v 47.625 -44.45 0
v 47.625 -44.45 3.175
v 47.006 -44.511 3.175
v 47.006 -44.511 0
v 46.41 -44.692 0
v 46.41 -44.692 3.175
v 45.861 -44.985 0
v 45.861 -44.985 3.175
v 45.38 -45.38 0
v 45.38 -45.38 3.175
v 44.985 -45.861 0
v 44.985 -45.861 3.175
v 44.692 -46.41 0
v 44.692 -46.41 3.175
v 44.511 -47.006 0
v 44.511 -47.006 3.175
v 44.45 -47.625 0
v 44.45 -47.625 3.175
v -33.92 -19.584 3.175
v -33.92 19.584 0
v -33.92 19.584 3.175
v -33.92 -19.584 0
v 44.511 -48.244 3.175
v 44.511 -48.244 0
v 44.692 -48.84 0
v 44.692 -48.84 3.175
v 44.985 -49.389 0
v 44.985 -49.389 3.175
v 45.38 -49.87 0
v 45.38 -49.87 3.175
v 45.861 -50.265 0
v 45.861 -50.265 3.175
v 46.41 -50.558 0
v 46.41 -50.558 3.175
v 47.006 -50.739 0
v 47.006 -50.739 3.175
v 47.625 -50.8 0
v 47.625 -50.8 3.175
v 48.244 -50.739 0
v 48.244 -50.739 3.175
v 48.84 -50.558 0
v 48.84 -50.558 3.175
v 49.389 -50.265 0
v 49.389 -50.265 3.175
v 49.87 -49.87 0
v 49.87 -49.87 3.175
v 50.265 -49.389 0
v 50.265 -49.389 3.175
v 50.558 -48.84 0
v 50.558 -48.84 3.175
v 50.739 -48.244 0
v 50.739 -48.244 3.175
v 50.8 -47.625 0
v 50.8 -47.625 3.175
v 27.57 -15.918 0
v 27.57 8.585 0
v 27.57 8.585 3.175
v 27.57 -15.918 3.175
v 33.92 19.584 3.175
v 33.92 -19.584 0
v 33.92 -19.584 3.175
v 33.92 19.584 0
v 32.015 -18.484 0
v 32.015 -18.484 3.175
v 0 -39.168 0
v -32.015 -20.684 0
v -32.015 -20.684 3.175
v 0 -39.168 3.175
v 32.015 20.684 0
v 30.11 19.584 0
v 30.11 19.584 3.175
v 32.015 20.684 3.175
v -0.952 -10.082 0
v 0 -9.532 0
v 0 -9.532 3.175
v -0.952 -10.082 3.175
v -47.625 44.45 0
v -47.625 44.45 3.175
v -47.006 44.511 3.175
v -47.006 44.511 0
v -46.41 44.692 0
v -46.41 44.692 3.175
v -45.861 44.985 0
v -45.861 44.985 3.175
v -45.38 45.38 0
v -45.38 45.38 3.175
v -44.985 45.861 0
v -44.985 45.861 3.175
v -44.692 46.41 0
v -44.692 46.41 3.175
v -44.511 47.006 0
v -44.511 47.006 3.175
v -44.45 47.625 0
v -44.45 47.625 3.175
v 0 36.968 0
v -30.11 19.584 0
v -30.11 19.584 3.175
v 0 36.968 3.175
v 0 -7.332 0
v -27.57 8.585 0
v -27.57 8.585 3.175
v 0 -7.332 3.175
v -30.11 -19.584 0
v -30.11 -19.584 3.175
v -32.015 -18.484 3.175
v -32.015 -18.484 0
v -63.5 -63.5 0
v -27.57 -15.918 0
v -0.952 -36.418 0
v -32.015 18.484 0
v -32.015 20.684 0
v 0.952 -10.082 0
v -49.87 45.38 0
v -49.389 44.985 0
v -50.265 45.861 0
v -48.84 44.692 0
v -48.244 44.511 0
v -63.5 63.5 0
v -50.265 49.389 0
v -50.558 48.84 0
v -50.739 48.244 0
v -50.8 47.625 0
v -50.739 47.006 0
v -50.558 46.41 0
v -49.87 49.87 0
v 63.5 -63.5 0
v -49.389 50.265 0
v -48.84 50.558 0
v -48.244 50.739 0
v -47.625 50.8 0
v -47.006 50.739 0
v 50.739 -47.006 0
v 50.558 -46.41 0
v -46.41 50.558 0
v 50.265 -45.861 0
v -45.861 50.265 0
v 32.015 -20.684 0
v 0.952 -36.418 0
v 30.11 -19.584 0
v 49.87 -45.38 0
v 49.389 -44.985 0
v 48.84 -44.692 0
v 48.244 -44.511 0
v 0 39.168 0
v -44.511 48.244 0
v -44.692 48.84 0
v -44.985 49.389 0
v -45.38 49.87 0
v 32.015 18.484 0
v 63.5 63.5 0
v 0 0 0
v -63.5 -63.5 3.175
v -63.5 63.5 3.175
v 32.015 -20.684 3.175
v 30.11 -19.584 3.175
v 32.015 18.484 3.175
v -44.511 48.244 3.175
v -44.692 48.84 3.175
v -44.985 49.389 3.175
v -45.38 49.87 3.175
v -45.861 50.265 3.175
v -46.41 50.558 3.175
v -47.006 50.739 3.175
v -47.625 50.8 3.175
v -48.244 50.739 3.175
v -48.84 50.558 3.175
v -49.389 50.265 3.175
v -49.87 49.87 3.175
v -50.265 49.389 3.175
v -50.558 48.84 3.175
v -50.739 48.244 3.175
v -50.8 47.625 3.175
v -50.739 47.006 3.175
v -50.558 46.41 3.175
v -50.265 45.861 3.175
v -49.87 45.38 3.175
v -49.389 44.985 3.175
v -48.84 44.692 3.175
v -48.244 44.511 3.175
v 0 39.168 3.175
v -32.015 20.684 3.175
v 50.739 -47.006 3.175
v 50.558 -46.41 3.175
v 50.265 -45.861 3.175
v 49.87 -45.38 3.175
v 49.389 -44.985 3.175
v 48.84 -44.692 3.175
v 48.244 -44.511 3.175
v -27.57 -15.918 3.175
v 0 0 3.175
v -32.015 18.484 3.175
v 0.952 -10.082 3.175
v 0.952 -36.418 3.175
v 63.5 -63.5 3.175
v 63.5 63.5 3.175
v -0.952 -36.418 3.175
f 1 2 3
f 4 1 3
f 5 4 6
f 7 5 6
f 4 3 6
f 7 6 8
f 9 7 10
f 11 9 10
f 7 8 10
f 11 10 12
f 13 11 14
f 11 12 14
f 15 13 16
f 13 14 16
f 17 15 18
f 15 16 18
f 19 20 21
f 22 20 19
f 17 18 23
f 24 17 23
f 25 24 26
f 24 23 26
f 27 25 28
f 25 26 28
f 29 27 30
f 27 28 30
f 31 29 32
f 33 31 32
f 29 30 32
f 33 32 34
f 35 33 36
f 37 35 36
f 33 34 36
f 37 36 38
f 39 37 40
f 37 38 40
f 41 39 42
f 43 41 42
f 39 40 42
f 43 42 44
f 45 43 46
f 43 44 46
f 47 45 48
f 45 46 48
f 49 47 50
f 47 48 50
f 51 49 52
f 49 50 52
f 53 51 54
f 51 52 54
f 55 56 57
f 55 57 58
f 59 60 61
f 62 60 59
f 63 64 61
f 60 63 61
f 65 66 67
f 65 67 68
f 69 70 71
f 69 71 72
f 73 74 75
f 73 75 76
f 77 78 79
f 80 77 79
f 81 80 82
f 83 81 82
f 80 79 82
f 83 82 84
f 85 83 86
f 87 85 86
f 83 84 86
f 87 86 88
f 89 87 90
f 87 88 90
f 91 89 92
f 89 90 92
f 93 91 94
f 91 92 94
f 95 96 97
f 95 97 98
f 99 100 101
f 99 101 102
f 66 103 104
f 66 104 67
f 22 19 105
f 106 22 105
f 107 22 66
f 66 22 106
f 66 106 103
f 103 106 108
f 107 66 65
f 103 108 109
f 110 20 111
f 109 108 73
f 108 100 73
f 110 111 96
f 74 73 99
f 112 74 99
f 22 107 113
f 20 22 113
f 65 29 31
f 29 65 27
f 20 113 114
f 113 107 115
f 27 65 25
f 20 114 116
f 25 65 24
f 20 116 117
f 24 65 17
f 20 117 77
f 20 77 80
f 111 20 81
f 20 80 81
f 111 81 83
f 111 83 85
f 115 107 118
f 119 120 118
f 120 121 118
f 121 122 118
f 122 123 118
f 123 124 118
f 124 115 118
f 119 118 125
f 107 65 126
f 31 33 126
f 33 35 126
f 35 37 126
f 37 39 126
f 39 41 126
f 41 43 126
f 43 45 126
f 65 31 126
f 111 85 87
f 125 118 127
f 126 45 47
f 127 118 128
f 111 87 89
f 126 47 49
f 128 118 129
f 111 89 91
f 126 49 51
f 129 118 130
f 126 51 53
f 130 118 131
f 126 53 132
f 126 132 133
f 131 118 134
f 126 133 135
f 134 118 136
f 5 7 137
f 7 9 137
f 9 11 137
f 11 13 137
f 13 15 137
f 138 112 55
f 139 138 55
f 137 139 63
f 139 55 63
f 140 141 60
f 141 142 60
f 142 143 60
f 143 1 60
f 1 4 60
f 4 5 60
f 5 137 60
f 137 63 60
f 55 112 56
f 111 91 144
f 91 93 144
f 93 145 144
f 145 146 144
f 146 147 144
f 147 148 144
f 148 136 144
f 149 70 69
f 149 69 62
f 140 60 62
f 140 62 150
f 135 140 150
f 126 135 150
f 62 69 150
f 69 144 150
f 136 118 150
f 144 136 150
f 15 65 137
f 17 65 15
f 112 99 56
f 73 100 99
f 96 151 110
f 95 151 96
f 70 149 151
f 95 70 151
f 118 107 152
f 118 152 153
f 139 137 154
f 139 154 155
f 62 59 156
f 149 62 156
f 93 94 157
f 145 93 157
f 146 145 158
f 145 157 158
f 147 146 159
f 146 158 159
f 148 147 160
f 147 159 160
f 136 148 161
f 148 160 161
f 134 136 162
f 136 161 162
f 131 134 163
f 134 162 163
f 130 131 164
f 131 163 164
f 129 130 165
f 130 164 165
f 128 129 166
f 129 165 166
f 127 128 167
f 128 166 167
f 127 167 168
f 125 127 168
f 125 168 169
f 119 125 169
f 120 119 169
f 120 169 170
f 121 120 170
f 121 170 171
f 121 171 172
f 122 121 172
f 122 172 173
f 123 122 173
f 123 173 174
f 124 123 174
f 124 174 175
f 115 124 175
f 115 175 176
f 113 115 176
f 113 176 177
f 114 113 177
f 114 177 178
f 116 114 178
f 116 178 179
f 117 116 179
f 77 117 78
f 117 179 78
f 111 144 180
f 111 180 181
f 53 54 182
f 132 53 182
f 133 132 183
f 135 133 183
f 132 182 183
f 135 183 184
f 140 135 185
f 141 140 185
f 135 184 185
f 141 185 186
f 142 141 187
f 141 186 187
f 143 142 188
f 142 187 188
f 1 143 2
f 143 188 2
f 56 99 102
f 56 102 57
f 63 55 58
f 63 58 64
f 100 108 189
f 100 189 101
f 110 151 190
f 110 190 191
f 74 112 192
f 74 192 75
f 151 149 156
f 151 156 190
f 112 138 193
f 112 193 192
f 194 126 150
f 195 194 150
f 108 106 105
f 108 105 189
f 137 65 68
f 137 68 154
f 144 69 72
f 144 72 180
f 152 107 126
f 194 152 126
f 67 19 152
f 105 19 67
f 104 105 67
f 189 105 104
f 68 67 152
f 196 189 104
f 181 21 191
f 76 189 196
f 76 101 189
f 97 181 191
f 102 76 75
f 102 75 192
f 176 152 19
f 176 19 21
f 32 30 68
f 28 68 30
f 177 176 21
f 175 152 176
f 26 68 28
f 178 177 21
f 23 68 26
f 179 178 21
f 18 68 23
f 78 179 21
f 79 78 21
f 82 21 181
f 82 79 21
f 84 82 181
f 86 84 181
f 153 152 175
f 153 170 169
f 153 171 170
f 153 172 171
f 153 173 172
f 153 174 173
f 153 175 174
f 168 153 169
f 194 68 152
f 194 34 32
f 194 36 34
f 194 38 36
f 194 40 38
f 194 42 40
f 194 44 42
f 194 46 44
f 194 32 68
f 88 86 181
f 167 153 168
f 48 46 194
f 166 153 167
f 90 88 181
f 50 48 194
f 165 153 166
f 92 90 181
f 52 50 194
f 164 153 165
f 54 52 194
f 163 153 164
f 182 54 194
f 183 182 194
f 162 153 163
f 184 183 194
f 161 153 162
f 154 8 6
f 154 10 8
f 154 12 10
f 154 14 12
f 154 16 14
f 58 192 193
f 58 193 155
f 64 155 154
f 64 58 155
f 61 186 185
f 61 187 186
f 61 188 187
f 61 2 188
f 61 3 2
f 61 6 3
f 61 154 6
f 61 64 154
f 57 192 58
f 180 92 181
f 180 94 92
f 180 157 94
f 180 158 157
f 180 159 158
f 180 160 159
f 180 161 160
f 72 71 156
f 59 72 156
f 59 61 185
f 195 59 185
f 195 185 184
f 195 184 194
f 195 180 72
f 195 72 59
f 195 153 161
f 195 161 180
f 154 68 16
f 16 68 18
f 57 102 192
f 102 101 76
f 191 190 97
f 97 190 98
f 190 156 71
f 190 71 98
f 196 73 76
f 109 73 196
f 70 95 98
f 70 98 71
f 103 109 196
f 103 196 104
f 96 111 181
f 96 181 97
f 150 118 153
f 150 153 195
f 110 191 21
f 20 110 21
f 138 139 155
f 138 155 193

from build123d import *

# Parameters (mm, degrees)
F1_W     = 127
F1_H     = 127
F2_DEPTH = 3.175
F3_DEPTH = 25.4
F5_DEPTH = 25.4


with BuildPart() as f2:
    # F1 (on Top) → F2 (new body)
    with BuildSketch(Plane.XY):
        Rectangle(F1_W, F1_H)
    extrude(amount=F2_DEPTH)

    # F0 (on Top) → F3 (cut)
    with BuildSketch(Plane.XY):
        Polygon((0, -39.167517), (32.015065, -20.683611), (30.110065, -19.583758), (0.9525, -36.417886), (0, -36.967812), (-0.9525, -36.417886), (-30.110065, -19.583758), (-32.015065, -20.683611), align=None)
        Polygon((30.110065, 19.583758), (32.015065, 20.683611), (0, 39.167517), (-32.015065, 20.683611), (-30.110065, 19.583758), (0, 36.967812), align=None)
        Polygon((33.920065, -19.583758), (33.920065, 19.583758), (32.015065, 18.483906), (0, 0), (-32.015065, 18.483906), (-33.920065, 19.583758), (-33.920065, -19.583758), (-32.015065, -18.483906), (-27.570065, -15.917584), (-27.570065, 6.385531), (-27.570065, 8.585236), (0, -7.332348), (27.570065, 8.585236), (27.570065, 6.385531), (27.570065, -15.917584), (32.015065, -18.483906), align=None)
        Polygon((0, -36.967812), (0.9525, -36.417886), (0.9525, -10.081979), (0, -9.532053), align=None)
        Polygon((-0.9525, -36.417886), (0, -36.967812), (0, -9.532053), (-0.9525, -10.081979), align=None)
    extrude(amount=F3_DEPTH, mode=Mode.SUBTRACT)

    # F4 (on face) → F5 (cut)
    with BuildSketch(Plane.XY.offset(3.175)):
        with BuildLine():
            ThreePointArc((-47.625, 44.45), (-45.379936, 45.379936), (-44.45, 47.625))
            Line((-44.45, 47.625), (-47.625, 47.625))
            Line((-47.625, 47.625), (-47.625, 44.45))
        make_face()
        with BuildLine():
            Line((-47.625, 47.625), (-44.45, 47.625))
            ThreePointArc((-44.45, 47.625), (-49.870064, 49.870064), (-47.625, 44.45))
            Line((-47.625, 44.45), (-47.625, 47.625))
        make_face()
        with BuildLine():
            ThreePointArc((50.8, -47.625), (49.870064, -45.379936), (47.625, -44.45))
            Line((47.625, -44.45), (47.625, -47.625))
            Line((47.625, -47.625), (44.45, -47.625))
            ThreePointArc((44.45, -47.625), (47.625, -50.8), (50.8, -47.625))
        make_face()
        with BuildLine():
            Line((47.625, -47.625), (47.625, -44.45))
            ThreePointArc((47.625, -44.45), (45.379936, -45.379936), (44.45, -47.625))
            Line((44.45, -47.625), (47.625, -47.625))
        make_face()
    extrude(amount=-F5_DEPTH, mode=Mode.SUBTRACT)


solid = f2.part
